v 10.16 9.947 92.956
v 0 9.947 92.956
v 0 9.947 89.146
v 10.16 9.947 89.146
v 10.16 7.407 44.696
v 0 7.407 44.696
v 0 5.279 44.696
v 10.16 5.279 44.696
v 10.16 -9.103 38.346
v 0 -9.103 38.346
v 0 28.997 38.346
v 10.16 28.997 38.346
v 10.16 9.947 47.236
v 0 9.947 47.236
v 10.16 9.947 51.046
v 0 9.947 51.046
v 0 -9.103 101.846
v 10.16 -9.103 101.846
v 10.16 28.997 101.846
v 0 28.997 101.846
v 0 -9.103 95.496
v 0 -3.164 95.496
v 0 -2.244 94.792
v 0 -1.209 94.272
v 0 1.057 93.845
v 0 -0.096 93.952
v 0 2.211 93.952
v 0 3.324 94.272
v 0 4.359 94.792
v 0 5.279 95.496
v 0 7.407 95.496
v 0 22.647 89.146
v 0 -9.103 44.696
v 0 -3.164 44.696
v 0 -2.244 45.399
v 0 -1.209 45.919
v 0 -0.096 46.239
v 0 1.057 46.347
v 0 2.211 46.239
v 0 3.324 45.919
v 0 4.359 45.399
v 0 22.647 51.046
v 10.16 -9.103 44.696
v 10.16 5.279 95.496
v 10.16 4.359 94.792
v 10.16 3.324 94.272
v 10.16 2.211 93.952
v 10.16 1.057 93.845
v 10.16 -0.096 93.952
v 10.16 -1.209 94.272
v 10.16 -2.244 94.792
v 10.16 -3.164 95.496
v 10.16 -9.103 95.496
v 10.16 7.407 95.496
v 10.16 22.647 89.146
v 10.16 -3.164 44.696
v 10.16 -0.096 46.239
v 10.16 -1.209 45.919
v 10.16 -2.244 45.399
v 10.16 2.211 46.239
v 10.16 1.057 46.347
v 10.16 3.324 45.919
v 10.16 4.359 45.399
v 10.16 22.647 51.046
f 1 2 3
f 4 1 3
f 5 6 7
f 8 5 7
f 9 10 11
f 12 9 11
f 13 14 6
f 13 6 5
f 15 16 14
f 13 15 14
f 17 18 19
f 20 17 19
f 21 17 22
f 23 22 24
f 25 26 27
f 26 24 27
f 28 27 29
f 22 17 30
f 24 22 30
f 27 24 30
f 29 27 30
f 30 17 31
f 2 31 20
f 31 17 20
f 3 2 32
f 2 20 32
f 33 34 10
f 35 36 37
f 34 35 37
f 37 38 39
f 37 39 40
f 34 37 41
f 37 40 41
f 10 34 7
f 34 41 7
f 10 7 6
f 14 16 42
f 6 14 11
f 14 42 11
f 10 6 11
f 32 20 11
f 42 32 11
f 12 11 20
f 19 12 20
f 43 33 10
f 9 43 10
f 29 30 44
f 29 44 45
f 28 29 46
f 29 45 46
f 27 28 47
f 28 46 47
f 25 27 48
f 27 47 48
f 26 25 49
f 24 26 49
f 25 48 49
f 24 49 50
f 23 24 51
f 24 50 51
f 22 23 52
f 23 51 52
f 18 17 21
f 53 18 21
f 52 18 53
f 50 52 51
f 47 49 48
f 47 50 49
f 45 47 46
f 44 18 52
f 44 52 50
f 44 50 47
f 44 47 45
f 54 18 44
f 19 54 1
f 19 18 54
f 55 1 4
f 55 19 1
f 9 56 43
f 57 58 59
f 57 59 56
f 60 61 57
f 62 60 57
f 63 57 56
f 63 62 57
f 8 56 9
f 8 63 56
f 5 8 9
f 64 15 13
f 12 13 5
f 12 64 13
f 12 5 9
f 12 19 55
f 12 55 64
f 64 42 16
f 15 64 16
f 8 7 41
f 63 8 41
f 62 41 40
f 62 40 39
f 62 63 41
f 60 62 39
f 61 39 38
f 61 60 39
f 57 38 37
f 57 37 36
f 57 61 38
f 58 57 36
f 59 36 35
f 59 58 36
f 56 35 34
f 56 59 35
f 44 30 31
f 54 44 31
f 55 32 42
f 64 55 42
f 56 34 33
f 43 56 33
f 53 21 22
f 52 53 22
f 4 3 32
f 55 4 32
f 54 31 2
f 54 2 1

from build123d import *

# Parameters (mm, degrees)
BOSS_EXTRUDE1_DEPTH = 10.16
BOSS_EXTRUDE2_DEPTH = 10.16
CHAMFER1_SIZE       = 2.54


with BuildPart() as part:
    # Sketch3 → Boss-Extrude1 (new body)
    with BuildSketch(Plane(origin=(0, 0, 0), x_dir=(0, 0, -1), z_dir=(1, 0, 0))):
        Polygon((-101.845577666, -9.102652747), (-95.495577666, -9.102652747), (-95.495577666, 9.947347253), (-89.145577666, 9.947347253), (-89.145577666, 22.647347253), (-51.045577666, 22.647347253), (-51.045577666, 9.947347253), (-44.695577666, 9.947347253), (-44.695577666, -9.102652747), (-38.345577666, -9.102652747), (-38.345577666, 28.997347253), (-101.845577666, 28.997347253), align=None)
    extrude(amount=BOSS_EXTRUDE1_DEPTH)

    # Sketch4 → Boss-Extrude2 (add)
    with BuildSketch(Plane(origin=(10.16, 0, 0), x_dir=(0, 0, -1), z_dir=(1, 0, 0))):
        with BuildLine():
            Line((-101.845577666, -4.906246043), (-101.845577666, 7.020940549))
            ThreePointArc((-101.845577666, 7.020940549), (-93.844577666, 1.057347253), (-101.845577666, -4.906246043))
        make_face()
        with BuildLine():
            Line((-38.345577666, -4.906246043), (-38.345577666, 7.020940549))
            ThreePointArc((-38.345577666, 7.020940549), (-46.346577666, 1.057347253), (-38.345577666, -4.906246043))
        make_face()
    extrude(amount=-BOSS_EXTRUDE2_DEPTH)

    # Chamfer1
    chamfer1_edges = [part.edges().sort_by_distance(p)[0] for p in [
        (5.08, 9.947347253, 44.695577666),
        (5.08, 9.947347253, 95.495577666),
    ]]
    chamfer(chamfer1_edges, length=CHAMFER1_SIZE)


solid = part.part
